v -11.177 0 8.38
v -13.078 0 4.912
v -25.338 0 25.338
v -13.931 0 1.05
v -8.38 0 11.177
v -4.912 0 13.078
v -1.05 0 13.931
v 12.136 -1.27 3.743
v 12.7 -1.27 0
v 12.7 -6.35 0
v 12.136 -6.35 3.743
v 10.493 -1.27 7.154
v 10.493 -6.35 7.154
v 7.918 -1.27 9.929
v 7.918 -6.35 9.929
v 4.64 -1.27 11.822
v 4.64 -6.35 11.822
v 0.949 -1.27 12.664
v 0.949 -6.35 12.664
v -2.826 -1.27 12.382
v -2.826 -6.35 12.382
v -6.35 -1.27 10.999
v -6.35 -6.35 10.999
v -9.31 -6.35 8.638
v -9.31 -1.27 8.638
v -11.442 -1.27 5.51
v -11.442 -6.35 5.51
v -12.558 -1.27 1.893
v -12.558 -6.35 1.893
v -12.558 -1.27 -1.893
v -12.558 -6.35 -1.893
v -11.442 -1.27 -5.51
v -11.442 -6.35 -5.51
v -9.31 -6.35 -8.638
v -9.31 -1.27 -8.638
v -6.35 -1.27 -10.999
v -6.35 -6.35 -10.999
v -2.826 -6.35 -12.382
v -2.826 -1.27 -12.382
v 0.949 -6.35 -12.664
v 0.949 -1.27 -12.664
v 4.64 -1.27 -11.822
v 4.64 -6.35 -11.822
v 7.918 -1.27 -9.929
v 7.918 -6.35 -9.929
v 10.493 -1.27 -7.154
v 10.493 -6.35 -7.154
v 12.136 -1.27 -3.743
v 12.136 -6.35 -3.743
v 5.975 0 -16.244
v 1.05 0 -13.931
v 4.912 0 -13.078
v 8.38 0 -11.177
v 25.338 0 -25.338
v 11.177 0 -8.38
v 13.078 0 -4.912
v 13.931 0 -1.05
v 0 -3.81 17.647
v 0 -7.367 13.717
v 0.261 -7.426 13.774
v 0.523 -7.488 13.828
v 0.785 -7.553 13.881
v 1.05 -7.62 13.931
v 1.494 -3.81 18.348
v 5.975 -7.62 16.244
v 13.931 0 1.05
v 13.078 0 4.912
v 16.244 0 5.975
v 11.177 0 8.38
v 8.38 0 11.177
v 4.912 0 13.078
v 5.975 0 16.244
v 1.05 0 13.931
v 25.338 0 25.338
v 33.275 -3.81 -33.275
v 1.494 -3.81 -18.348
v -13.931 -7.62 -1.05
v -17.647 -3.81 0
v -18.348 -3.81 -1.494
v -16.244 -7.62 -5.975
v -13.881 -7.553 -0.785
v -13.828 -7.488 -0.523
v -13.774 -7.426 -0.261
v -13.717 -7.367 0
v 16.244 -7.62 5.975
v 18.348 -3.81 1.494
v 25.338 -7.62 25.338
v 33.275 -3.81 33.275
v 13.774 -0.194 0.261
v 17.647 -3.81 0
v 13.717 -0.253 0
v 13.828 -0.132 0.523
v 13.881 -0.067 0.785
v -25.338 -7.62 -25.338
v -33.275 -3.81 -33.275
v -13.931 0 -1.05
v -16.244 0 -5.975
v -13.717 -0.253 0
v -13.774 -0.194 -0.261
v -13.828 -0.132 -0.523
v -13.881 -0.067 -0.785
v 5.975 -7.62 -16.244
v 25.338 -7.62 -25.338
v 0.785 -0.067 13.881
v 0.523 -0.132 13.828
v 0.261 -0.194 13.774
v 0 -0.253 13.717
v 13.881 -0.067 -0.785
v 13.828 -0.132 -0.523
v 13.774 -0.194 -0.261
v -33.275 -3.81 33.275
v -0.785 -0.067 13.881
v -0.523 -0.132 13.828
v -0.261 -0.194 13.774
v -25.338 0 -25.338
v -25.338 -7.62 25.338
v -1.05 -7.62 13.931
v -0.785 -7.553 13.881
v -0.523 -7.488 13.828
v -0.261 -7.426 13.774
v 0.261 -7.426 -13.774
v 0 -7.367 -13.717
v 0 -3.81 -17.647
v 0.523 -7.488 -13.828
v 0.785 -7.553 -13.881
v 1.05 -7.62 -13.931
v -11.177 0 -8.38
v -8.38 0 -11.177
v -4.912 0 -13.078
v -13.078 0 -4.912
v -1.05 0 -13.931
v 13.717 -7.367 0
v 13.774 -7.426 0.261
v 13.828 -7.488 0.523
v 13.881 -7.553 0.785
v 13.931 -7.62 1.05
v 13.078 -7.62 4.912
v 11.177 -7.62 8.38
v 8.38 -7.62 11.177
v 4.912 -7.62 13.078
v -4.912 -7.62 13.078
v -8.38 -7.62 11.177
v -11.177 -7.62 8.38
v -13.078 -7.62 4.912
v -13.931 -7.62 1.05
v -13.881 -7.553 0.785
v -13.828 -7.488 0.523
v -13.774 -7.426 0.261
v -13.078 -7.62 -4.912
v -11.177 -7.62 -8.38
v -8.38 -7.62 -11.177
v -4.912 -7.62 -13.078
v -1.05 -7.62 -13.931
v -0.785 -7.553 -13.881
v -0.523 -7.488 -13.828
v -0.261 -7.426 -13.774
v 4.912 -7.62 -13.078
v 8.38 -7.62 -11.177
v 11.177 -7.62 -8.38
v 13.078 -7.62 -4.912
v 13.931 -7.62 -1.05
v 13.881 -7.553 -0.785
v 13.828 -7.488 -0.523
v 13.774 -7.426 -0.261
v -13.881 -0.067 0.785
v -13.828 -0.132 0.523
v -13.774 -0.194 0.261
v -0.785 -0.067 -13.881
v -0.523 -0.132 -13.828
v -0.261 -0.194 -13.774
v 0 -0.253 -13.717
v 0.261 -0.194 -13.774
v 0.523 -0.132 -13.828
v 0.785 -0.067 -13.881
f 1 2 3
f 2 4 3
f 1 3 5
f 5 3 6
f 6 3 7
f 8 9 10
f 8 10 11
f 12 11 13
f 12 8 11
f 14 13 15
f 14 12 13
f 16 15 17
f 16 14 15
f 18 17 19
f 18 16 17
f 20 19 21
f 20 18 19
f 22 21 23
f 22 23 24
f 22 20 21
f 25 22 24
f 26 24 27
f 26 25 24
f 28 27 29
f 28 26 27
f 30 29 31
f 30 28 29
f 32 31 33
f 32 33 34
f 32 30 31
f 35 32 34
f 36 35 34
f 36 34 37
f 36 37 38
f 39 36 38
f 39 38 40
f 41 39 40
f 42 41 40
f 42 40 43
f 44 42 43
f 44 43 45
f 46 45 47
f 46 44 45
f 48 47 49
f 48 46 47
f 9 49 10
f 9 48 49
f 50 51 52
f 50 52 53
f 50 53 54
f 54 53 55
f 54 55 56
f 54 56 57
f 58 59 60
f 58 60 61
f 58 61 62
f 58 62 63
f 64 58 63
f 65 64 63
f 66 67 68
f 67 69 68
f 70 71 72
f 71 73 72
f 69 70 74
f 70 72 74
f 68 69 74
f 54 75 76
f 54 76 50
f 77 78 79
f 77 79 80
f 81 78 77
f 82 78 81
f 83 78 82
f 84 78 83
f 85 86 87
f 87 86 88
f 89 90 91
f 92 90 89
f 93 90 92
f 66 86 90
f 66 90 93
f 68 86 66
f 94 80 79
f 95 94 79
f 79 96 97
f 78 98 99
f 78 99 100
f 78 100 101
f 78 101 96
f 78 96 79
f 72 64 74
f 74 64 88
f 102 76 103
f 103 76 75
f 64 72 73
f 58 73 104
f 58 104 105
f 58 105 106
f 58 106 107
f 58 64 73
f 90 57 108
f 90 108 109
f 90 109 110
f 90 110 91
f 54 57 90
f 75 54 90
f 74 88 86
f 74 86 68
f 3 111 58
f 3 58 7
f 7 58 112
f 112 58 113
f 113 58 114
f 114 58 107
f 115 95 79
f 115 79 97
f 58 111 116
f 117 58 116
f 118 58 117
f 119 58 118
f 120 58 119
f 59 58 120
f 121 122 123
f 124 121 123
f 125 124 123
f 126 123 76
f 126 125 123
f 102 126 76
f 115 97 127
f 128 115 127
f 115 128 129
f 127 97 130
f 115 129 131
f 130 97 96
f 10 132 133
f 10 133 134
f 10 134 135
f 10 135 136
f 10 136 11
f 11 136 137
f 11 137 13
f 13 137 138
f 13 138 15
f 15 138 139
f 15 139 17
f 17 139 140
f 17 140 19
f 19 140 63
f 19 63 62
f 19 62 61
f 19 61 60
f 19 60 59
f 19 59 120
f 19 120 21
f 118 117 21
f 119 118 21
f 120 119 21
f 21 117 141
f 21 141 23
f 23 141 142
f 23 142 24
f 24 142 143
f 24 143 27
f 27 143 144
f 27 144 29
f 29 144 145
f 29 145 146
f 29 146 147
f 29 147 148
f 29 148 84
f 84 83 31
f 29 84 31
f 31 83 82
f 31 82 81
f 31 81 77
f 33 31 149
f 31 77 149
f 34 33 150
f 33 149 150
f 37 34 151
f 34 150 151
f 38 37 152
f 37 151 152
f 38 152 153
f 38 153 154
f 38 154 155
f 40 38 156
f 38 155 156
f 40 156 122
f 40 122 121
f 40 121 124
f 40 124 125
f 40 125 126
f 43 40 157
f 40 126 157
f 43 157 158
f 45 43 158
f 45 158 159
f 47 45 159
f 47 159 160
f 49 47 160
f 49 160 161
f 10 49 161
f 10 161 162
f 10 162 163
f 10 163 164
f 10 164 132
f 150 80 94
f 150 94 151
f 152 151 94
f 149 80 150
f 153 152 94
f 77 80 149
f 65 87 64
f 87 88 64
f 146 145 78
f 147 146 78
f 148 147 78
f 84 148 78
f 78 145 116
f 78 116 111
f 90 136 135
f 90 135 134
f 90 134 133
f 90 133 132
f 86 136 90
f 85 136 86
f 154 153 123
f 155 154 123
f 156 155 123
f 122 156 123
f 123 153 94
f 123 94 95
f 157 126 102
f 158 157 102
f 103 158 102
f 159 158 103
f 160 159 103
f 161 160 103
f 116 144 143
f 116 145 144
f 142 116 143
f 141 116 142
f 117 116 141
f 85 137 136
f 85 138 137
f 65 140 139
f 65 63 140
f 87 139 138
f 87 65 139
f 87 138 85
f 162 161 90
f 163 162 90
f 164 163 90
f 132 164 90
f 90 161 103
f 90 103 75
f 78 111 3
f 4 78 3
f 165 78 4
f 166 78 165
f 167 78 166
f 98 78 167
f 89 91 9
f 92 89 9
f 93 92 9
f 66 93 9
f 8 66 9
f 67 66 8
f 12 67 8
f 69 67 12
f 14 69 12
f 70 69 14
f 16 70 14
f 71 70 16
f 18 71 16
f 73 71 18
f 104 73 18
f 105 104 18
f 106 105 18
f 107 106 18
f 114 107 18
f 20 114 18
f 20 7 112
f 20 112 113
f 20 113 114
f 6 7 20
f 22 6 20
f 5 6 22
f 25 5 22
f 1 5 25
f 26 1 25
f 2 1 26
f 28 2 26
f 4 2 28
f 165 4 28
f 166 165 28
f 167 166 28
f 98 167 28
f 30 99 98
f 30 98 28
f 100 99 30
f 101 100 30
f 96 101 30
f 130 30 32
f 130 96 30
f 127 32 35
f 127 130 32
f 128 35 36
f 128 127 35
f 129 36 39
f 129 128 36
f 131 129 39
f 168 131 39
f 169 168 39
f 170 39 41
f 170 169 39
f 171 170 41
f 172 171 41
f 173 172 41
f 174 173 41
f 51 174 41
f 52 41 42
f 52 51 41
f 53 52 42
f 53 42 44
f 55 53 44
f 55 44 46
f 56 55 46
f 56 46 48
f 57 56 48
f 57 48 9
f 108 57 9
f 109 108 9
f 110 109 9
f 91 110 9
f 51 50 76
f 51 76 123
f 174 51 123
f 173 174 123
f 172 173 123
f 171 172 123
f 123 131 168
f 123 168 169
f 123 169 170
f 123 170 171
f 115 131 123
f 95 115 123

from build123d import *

# Parameters (mm, degrees)
F0_R          = 12.7
F1_DEPTH      = 7.62
F2_SIZE       = 1.27
F3_SIZE       = 1.27
F4_SIZE       = 5.08
F5_T4_DEPTH   = 65.8139573625
F6_SIZE       = 5.08
F7_T4_DEPTH   = 57.8584590231
F8_T4_DEPTH   = 72.4149723957
F8_T10_DEPTH  = 72.4149723957
F8_T16_DEPTH  = 72.4149723957
F9_T4_DEPTH   = 72.4149723957
F10_SIZE      = 5.08
F11_T4_DEPTH  = 57.8584590231
F12_T4_DEPTH  = 72.4149723957
F12_T10_DEPTH = 72.4149723957
F12_T16_DEPTH = 72.4149723957
F13_T4_DEPTH  = 72.4149723957
F14_SIZE      = 5.08
F15_T4_DEPTH  = 57.8584590231
F16_T4_DEPTH  = 72.4149723957
F16_T10_DEPTH = 72.4149723957
F16_T16_DEPTH = 72.4149723957
F17_T4_DEPTH  = 72.4149723957
F18_T4_DEPTH  = 64.4594740563
F18_T10_DEPTH = 64.4594740563
F18_T16_DEPTH = 64.4594740563
F19_T4_DEPTH  = 64.4594740563


# Not quite as in the source:
# - a fillet or chamfer that OpenCascade refuses, or shapes differently, is made with other operations: its cross-section is extruded or revolved along the edge and cut away or added


with BuildPart() as f1:
    # F0 (on Front) → F1 (new body)
    with BuildSketch(Plane.XZ):
        Polygon((-19.05, 0), (-35.9210244843, -35.9210244843), (0, -19.05), (35.9210244843, -35.9210244843), (19.05, 0), (35.9210244843, 35.9210244843), (0, 19.05), (-35.9210244843, 35.9210244843), align=None)
        Circle(F0_R, mode=Mode.SUBTRACT)
    extrude(amount=F1_DEPTH)

    # F2
    f2_edges = [f1.edges().sort_by_distance(p)[0] for p in [
        (-12.7, -7.62, 0),
    ]]
    chamfer(f2_edges, length=F2_SIZE)

    # F3
    f3_edges = [f1.edges().sort_by_distance(p)[0] for p in [
        (-12.7, 0, 0),
    ]]
    chamfer(f3_edges, length=F3_SIZE)

    # F4
    f4_edges = [f1.edges().sort_by_distance(p)[0] for p in [
        (17.960512, -7.62, 27.485512),
    ]]
    chamfer(f4_edges, length=F4_SIZE)

    # F5: chamfer of 5.08 on 1 edges, made by hand


with BuildPart() as f5_tool2:
    # F5_s3 → F5_t4 (new body)
    with BuildSketch(Plane(origin=(55.0761279539, 0, 25.8676002856), x_dir=(0, 1, 0), z_dir=(-0.9051386851, 0, -0.4251164085))):
        Polygon((-5.08, -17.2428919509), (0, -12.1628919509), (0, -17.2428919509), align=None)
    extrude(amount=F5_T4_DEPTH)

    split(bisect_by=Plane(origin=(7.330236298, 0, 15.6072085475), x_dir=(0, 1, 0), z_dir=(0.4251164085, 0, 0.9051386851)), keep=Keep.TOP)


with BuildPart() as f1_1:
    add(f1.part)

    # F5_t1: cut F5_tool2
    add(f5_tool2.part, mode=Mode.SUBTRACT)

    # F6
    f6_edges = [f1_1.edges().sort_by_distance(p)[0] for p in [
        (25.794506, -7.62, 14.360098),
    ]]
    chamfer(f6_edges, length=F6_SIZE)

    # F7: chamfer of 5.08 on 1 edges, made by hand


with BuildPart() as f7_tool2:
    # F7_s3 → F7_t4 (new body)
    with BuildSketch(Plane(origin=(-2.1109928963, 0, -4.4946308736), x_dir=(0, 1, 0), z_dir=(0.4251164085, 0, 0.9051386851))):
        Polygon((-5.08, -17.2428919509), (0, -12.1628919509), (0, -17.2428919509), align=None)
    extrude(amount=F7_T4_DEPTH)

    split(bisect_by=Plane(origin=(15.6072085475, 0, 7.330236298), x_dir=(0, 1, 0), z_dir=(0.9051386851, 0, 0.4251164085)), keep=Keep.TOP)


with BuildPart() as f1_2:
    add(f1_1.part)

    # F7_t1: cut F7_tool2
    add(f7_tool2.part, mode=Mode.SUBTRACT)

    # F8: chamfer of 5.08 on 1 edges, made by hand


with BuildPart() as f8_tool2:
    # F8_s3 → F8_t4 (new body)
    with BuildSketch(Plane(origin=(25.8676002856, 0, -55.0761279539), x_dir=(0, 1, 0), z_dir=(-0.4251164085, 0, 0.9051386851))):
        Polygon((-7.62, -12.1628919509), (-2.54, -17.2428919509), (-7.62, -17.2428919509), align=None)
    extrude(amount=F8_T4_DEPTH)

    split(bisect_by=Plane(origin=(5.5045520136, 6.0814459754, -2.5853224715), x_dir=(-0.741396788, 0.6710669138, 0), z_dir=(0.6400297021, 0.7071067812, -0.3006026952)), keep=Keep.TOP)

    split(bisect_by=Plane(origin=(8.9531304038, -9.8914459754, -4.2050159878), x_dir=(0.741396788, 0.6710669138, 0), z_dir=(0.6400297021, -0.7071067812, -0.3006026952)), keep=Keep.TOP)


with BuildPart() as f1_3:
    add(f1_2.part)

    # F8_t1: cut F8_tool2
    add(f8_tool2.part, mode=Mode.SUBTRACT)


with BuildPart() as f8_tool8:
    # F8_s9 → F8_t10 (new body)
    with BuildSketch(Plane(origin=(25.8676002856, 0, -55.0761279539), x_dir=(0, 1, 0), z_dir=(-0.4251164085, 0, 0.9051386851))):
        Polygon((-7.62, -12.1628919509), (-2.54, -17.2428919509), (-7.62, -17.2428919509), align=None)
    extrude(amount=F8_T10_DEPTH)

    split(bisect_by=Plane(origin=(5.5045520136, 6.0814459754, -2.5853224715), x_dir=(-0.741396788, 0.6710669138, 0), z_dir=(0.6400297021, 0.7071067812, -0.3006026952)), keep=Keep.TOP)

    split(bisect_by=Plane(origin=(8.9531304038, -9.8914459754, -4.2050159878), x_dir=(-0.741396788, -0.6710669138, 0), z_dir=(-0.6400297021, 0.7071067812, 0.3006026952)), keep=Keep.TOP)


with BuildPart() as f1_4:
    add(f1_3.part)

    # F8_t7: cut F8_tool8
    add(f8_tool8.part, mode=Mode.SUBTRACT)


with BuildPart() as f8_tool14:
    # F8_s15 → F8_t16 (new body)
    with BuildSketch(Plane(origin=(25.8676002856, 0, -55.0761279539), x_dir=(0, 1, 0), z_dir=(-0.4251164085, 0, 0.9051386851))):
        Polygon((-7.62, -12.1628919509), (-2.54, -17.2428919509), (-7.62, -17.2428919509), align=None)
    extrude(amount=F8_T16_DEPTH)

    split(bisect_by=Plane(origin=(5.5045520136, 6.0814459754, -2.5853224715), x_dir=(0.741396788, -0.6710669138, 0), z_dir=(-0.6400297021, -0.7071067812, 0.3006026952)), keep=Keep.TOP)

    split(bisect_by=Plane(origin=(8.9531304038, -9.8914459754, -4.2050159878), x_dir=(0.741396788, 0.6710669138, 0), z_dir=(0.6400297021, -0.7071067812, -0.3006026952)), keep=Keep.TOP)


with BuildPart() as f1_5:
    add(f1_4.part)

    # F8_t13: cut F8_tool14
    add(f8_tool14.part, mode=Mode.SUBTRACT)

    # F9: chamfer of 5.08 on 1 edges, made by hand


with BuildPart() as f9_tool2:
    # F9_s3 → F9_t4 (new body)
    with BuildSketch(Plane(origin=(25.8676002856, 0, -55.0761279539), x_dir=(0, 1, 0), z_dir=(-0.4251164085, 0, 0.9051386851))):
        Polygon((0, -12.1628919509), (-5.08, -17.2428919509), (0, -17.2428919509), align=None)
    extrude(amount=F9_T4_DEPTH)

    split(bisect_by=Plane(origin=(5.5045520136, 6.0814459754, -2.5853224715), x_dir=(-0.741396788, 0.6710669138, 0), z_dir=(0.6400297021, 0.7071067812, -0.3006026952)), keep=Keep.TOP)


with BuildPart() as f1_6:
    add(f1_5.part)

    # F9_t1: cut F9_tool2
    add(f9_tool2.part, mode=Mode.SUBTRACT)

    # F10
    f10_edges = [f1_6.edges().sort_by_distance(p)[0] for p in [
        (14.360098, -7.62, -25.794506),
    ]]
    chamfer(f10_edges, length=F10_SIZE)

    # F11: chamfer of 5.08 on 1 edges, made by hand


with BuildPart() as f11_tool2:
    # F11_s3 → F11_t4 (new body)
    with BuildSketch(Plane(origin=(-4.4946308736, 0, 2.1109928963), x_dir=(0, 1, 0), z_dir=(0.9051386851, 0, -0.4251164085))):
        Polygon((-5.08, -17.2428919509), (0, -12.1628919509), (0, -17.2428919509), align=None)
    extrude(amount=F11_T4_DEPTH)

    split(bisect_by=Plane(origin=(7.330236298, 0, -15.6072085475), x_dir=(0, 1, 0), z_dir=(0.4251164085, 0, -0.9051386851)), keep=Keep.TOP)


with BuildPart() as f1_7:
    add(f1_6.part)

    # F11_t1: cut F11_tool2
    add(f11_tool2.part, mode=Mode.SUBTRACT)

    # F12: chamfer of 5.08 on 1 edges, made by hand


with BuildPart() as f12_tool2:
    # F12_s3 → F12_t4 (new body)
    with BuildSketch(Plane(origin=(-55.0761279539, 0, -25.8676002856), x_dir=(0, 1, 0), z_dir=(0.9051386851, 0, 0.4251164085))):
        Polygon((0, -12.1628919509), (-5.08, -17.2428919509), (0, -17.2428919509), align=None)
    extrude(amount=F12_T4_DEPTH)

    split(bisect_by=Plane(origin=(-4.2050159878, -9.8914459754, -8.9531304038), x_dir=(0.9202923495, -0.3912313784, 0), z_dir=(-0.3006026952, -0.7071067812, -0.6400297021)), keep=Keep.TOP)

    split(bisect_by=Plane(origin=(-2.5853224715, 6.0814459755, -5.5045520136), x_dir=(-0.9202923495, -0.3912313784, 0), z_dir=(-0.3006026952, 0.7071067812, -0.6400297021)), keep=Keep.TOP)


with BuildPart() as f1_8:
    add(f1_7.part)

    # F12_t1: cut F12_tool2
    add(f12_tool2.part, mode=Mode.SUBTRACT)


with BuildPart() as f12_tool8:
    # F12_s9 → F12_t10 (new body)
    with BuildSketch(Plane(origin=(-55.0761279539, 0, -25.8676002856), x_dir=(0, 1, 0), z_dir=(0.9051386851, 0, 0.4251164085))):
        Polygon((0, -12.1628919509), (-5.08, -17.2428919509), (0, -17.2428919509), align=None)
    extrude(amount=F12_T10_DEPTH)

    split(bisect_by=Plane(origin=(-4.2050159878, -9.8914459754, -8.9531304038), x_dir=(0.9202923495, -0.3912313784, 0), z_dir=(-0.3006026952, -0.7071067812, -0.6400297021)), keep=Keep.TOP)

    split(bisect_by=Plane(origin=(-2.5853224715, 6.0814459755, -5.5045520136), x_dir=(0.9202923495, 0.3912313784, 0), z_dir=(0.3006026952, -0.7071067812, 0.6400297021)), keep=Keep.TOP)


with BuildPart() as f1_9:
    add(f1_8.part)

    # F12_t7: cut F12_tool8
    add(f12_tool8.part, mode=Mode.SUBTRACT)


with BuildPart() as f12_tool14:
    # F12_s15 → F12_t16 (new body)
    with BuildSketch(Plane(origin=(-55.0761279539, 0, -25.8676002856), x_dir=(0, 1, 0), z_dir=(0.9051386851, 0, 0.4251164085))):
        Polygon((0, -12.1628919509), (-5.08, -17.2428919509), (0, -17.2428919509), align=None)
    extrude(amount=F12_T16_DEPTH)

    split(bisect_by=Plane(origin=(-4.2050159878, -9.8914459754, -8.9531304038), x_dir=(-0.9202923495, 0.3912313784, 0), z_dir=(0.3006026952, 0.7071067812, 0.6400297021)), keep=Keep.TOP)

    split(bisect_by=Plane(origin=(-2.5853224715, 6.0814459755, -5.5045520136), x_dir=(-0.9202923495, -0.3912313784, 0), z_dir=(-0.3006026952, 0.7071067812, -0.6400297021)), keep=Keep.TOP)


with BuildPart() as f1_10:
    add(f1_9.part)

    # F12_t13: cut F12_tool14
    add(f12_tool14.part, mode=Mode.SUBTRACT)

    # F13: chamfer of 5.08 on 1 edges, made by hand


with BuildPart() as f13_tool2:
    # F13_s3 → F13_t4 (new body)
    with BuildSketch(Plane(origin=(-55.0761279539, 0, -25.8676002856), x_dir=(0, 1, 0), z_dir=(0.9051386851, 0, 0.4251164085))):
        Polygon((-7.62, -12.1628919509), (-2.54, -17.2428919509), (-7.62, -17.2428919509), align=None)
    extrude(amount=F13_T4_DEPTH)

    split(bisect_by=Plane(origin=(-4.2050159878, -9.8914459754, -8.9531304038), x_dir=(0.9202923495, -0.3912313784, 0), z_dir=(-0.3006026952, -0.7071067812, -0.6400297021)), keep=Keep.TOP)


with BuildPart() as f1_11:
    add(f1_10.part)

    # F13_t1: cut F13_tool2
    add(f13_tool2.part, mode=Mode.SUBTRACT)

    # F14
    f14_edges = [f1_11.edges().sort_by_distance(p)[0] for p in [
        (-25.794506, -7.62, -14.360098),
    ]]
    chamfer(f14_edges, length=F14_SIZE)

    # F15: chamfer of 5.08 on 1 edges, made by hand


with BuildPart() as f15_tool2:
    # F15_s3 → F15_t4 (new body)
    with BuildSketch(Plane(origin=(2.1109928963, 0, 4.4946308736), x_dir=(0, 1, 0), z_dir=(-0.4251164085, 0, -0.9051386851))):
        Polygon((-5.08, -17.2428919509), (0, -12.1628919509), (0, -17.2428919509), align=None)
    extrude(amount=F15_T4_DEPTH)

    split(bisect_by=Plane(origin=(-15.6072085475, 0, -7.330236298), x_dir=(0, 1, 0), z_dir=(-0.9051386851, 0, -0.4251164085)), keep=Keep.TOP)


with BuildPart() as f1_12:
    add(f1_11.part)

    # F15_t1: cut F15_tool2
    add(f15_tool2.part, mode=Mode.SUBTRACT)

    # F16: chamfer of 5.08 on 1 edges, made by hand


with BuildPart() as f16_tool2:
    # F16_s3 → F16_t4 (new body)
    with BuildSketch(Plane(origin=(-25.8676002856, 0, 55.0761279539), x_dir=(0, 1, 0), z_dir=(0.4251164085, 0, -0.9051386851))):
        Polygon((-7.62, -12.1628919509), (-2.54, -17.2428919509), (-7.62, -17.2428919509), align=None)
    extrude(amount=F16_T4_DEPTH)

    split(bisect_by=Plane(origin=(-5.5045520136, 6.0814459754, 2.5853224715), x_dir=(-0.741396788, -0.6710669138, 0), z_dir=(-0.6400297021, 0.7071067812, 0.3006026952)), keep=Keep.TOP)

    split(bisect_by=Plane(origin=(-8.9531304038, -9.8914459754, 4.2050159878), x_dir=(0.741396788, -0.6710669138, 0), z_dir=(-0.6400297021, -0.7071067812, 0.3006026952)), keep=Keep.TOP)


with BuildPart() as f1_13:
    add(f1_12.part)

    # F16_t1: cut F16_tool2
    add(f16_tool2.part, mode=Mode.SUBTRACT)


with BuildPart() as f16_tool8:
    # F16_s9 → F16_t10 (new body)
    with BuildSketch(Plane(origin=(-25.8676002856, 0, 55.0761279539), x_dir=(0, 1, 0), z_dir=(0.4251164085, 0, -0.9051386851))):
        Polygon((-7.62, -12.1628919509), (-2.54, -17.2428919509), (-7.62, -17.2428919509), align=None)
    extrude(amount=F16_T10_DEPTH)

    split(bisect_by=Plane(origin=(-5.5045520136, 6.0814459754, 2.5853224715), x_dir=(-0.741396788, -0.6710669138, 0), z_dir=(-0.6400297021, 0.7071067812, 0.3006026952)), keep=Keep.TOP)

    split(bisect_by=Plane(origin=(-8.9531304038, -9.8914459754, 4.2050159878), x_dir=(-0.741396788, 0.6710669138, 0), z_dir=(0.6400297021, 0.7071067812, -0.3006026952)), keep=Keep.TOP)


with BuildPart() as f1_14:
    add(f1_13.part)

    # F16_t7: cut F16_tool8
    add(f16_tool8.part, mode=Mode.SUBTRACT)


with BuildPart() as f16_tool14:
    # F16_s15 → F16_t16 (new body)
    with BuildSketch(Plane(origin=(-25.8676002856, 0, 55.0761279539), x_dir=(0, 1, 0), z_dir=(0.4251164085, 0, -0.9051386851))):
        Polygon((-7.62, -12.1628919509), (-2.54, -17.2428919509), (-7.62, -17.2428919509), align=None)
    extrude(amount=F16_T16_DEPTH)

    split(bisect_by=Plane(origin=(-5.5045520136, 6.0814459754, 2.5853224715), x_dir=(0.741396788, 0.6710669138, 0), z_dir=(0.6400297021, -0.7071067812, -0.3006026952)), keep=Keep.TOP)

    split(bisect_by=Plane(origin=(-8.9531304038, -9.8914459754, 4.2050159878), x_dir=(0.741396788, -0.6710669138, 0), z_dir=(-0.6400297021, -0.7071067812, 0.3006026952)), keep=Keep.TOP)


with BuildPart() as f1_15:
    add(f1_14.part)

    # F16_t13: cut F16_tool14
    add(f16_tool14.part, mode=Mode.SUBTRACT)

    # F17: chamfer of 5.08 on 1 edges, made by hand


with BuildPart() as f17_tool2:
    # F17_s3 → F17_t4 (new body)
    with BuildSketch(Plane(origin=(4.9171926996, 0, -10.4694649409), x_dir=(0, 1, 0), z_dir=(-0.4251164085, 0, 0.9051386851))):
        Polygon((-5.08, 17.2428919509), (0, 12.1628919509), (0, 17.2428919509), align=None)
    extrude(amount=F17_T4_DEPTH)

    split(bisect_by=Plane(origin=(-5.5045520136, 6.0814459754, 2.5853224715), x_dir=(-0.741396788, -0.6710669138, 0), z_dir=(-0.6400297021, 0.7071067812, 0.3006026952)), keep=Keep.TOP)


with BuildPart() as f1_16:
    add(f1_15.part)

    # F17_t1: cut F17_tool2
    add(f17_tool2.part, mode=Mode.SUBTRACT)

    # F18: chamfer of 5.08 on 1 edges, made by hand


with BuildPart() as f18_tool2:
    # F18_s3 → F18_t4 (new body)
    with BuildSketch(Plane(origin=(10.469464941, 0, -4.9171926996), x_dir=(0, 1, 0), z_dir=(-0.9051386851, 0, 0.4251164085))):
        Polygon((-2.54, -17.2428919509), (-7.62, -12.1628919509), (-7.62, -17.2428919509), align=None)
    extrude(amount=F18_T4_DEPTH)

    split(bisect_by=Plane(origin=(-4.2050159878, -9.8914459754, 8.9531304038), x_dir=(0.9202923495, -0.3912313784, 0), z_dir=(-0.3006026952, -0.7071067812, 0.6400297021)), keep=Keep.TOP)

    split(bisect_by=Plane(origin=(-2.5853224715, 6.0814459755, 5.5045520136), x_dir=(0.9202923495, 0.3912313784, 0), z_dir=(0.3006026952, -0.7071067812, -0.6400297021)), keep=Keep.TOP)


with BuildPart() as f1_17:
    add(f1_16.part)

    # F18_t1: cut F18_tool2
    add(f18_tool2.part, mode=Mode.SUBTRACT)


with BuildPart() as f18_tool8:
    # F18_s9 → F18_t10 (new body)
    with BuildSketch(Plane(origin=(10.469464941, 0, -4.9171926996), x_dir=(0, 1, 0), z_dir=(-0.9051386851, 0, 0.4251164085))):
        Polygon((-2.54, -17.2428919509), (-7.62, -12.1628919509), (-7.62, -17.2428919509), align=None)
    extrude(amount=F18_T10_DEPTH)

    split(bisect_by=Plane(origin=(-4.2050159878, -9.8914459754, 8.9531304038), x_dir=(-0.9202923495, 0.3912313784, 0), z_dir=(0.3006026952, 0.7071067812, -0.6400297021)), keep=Keep.TOP)

    split(bisect_by=Plane(origin=(-2.5853224715, 6.0814459755, 5.5045520136), x_dir=(-0.9202923495, -0.3912313784, 0), z_dir=(-0.3006026952, 0.7071067812, 0.6400297021)), keep=Keep.TOP)


with BuildPart() as f1_18:
    add(f1_17.part)

    # F18_t7: cut F18_tool8
    add(f18_tool8.part, mode=Mode.SUBTRACT)


with BuildPart() as f18_tool14:
    # F18_s15 → F18_t16 (new body)
    with BuildSketch(Plane(origin=(10.469464941, 0, -4.9171926996), x_dir=(0, 1, 0), z_dir=(-0.9051386851, 0, 0.4251164085))):
        Polygon((-2.54, -17.2428919509), (-7.62, -12.1628919509), (-7.62, -17.2428919509), align=None)
    extrude(amount=F18_T16_DEPTH)

    split(bisect_by=Plane(origin=(-4.2050159878, -9.8914459754, 8.9531304038), x_dir=(0.9202923495, -0.3912313784, 0), z_dir=(-0.3006026952, -0.7071067812, 0.6400297021)), keep=Keep.TOP)

    split(bisect_by=Plane(origin=(-2.5853224715, 6.0814459755, 5.5045520136), x_dir=(-0.9202923495, -0.3912313784, 0), z_dir=(-0.3006026952, 0.7071067812, 0.6400297021)), keep=Keep.TOP)


with BuildPart() as f1_19:
    add(f1_18.part)

    # F18_t13: cut F18_tool14
    add(f18_tool14.part, mode=Mode.SUBTRACT)

    # F19: chamfer of 5.08 on 1 edges, made by hand


with BuildPart() as f19_tool2:
    # F19_s3 → F19_t4 (new body)
    with BuildSketch(Plane(origin=(10.4694649409, 0, -4.9171926996), x_dir=(0, 1, 0), z_dir=(-0.9051386851, 0, 0.4251164085))):
        Polygon((-5.08, -17.2428919509), (0, -12.1628919509), (0, -17.2428919509), align=None)
    extrude(amount=F19_T4_DEPTH)

    split(bisect_by=Plane(origin=(-2.5853224715, 6.0814459755, 5.5045520136), x_dir=(-0.9202923495, -0.3912313784, 0), z_dir=(-0.3006026952, 0.7071067812, 0.6400297021)), keep=Keep.TOP)


with BuildPart() as f1_20:
    add(f1_19.part)

    # F19_t1: cut F19_tool2
    add(f19_tool2.part, mode=Mode.SUBTRACT)


solid = f1_20.part
